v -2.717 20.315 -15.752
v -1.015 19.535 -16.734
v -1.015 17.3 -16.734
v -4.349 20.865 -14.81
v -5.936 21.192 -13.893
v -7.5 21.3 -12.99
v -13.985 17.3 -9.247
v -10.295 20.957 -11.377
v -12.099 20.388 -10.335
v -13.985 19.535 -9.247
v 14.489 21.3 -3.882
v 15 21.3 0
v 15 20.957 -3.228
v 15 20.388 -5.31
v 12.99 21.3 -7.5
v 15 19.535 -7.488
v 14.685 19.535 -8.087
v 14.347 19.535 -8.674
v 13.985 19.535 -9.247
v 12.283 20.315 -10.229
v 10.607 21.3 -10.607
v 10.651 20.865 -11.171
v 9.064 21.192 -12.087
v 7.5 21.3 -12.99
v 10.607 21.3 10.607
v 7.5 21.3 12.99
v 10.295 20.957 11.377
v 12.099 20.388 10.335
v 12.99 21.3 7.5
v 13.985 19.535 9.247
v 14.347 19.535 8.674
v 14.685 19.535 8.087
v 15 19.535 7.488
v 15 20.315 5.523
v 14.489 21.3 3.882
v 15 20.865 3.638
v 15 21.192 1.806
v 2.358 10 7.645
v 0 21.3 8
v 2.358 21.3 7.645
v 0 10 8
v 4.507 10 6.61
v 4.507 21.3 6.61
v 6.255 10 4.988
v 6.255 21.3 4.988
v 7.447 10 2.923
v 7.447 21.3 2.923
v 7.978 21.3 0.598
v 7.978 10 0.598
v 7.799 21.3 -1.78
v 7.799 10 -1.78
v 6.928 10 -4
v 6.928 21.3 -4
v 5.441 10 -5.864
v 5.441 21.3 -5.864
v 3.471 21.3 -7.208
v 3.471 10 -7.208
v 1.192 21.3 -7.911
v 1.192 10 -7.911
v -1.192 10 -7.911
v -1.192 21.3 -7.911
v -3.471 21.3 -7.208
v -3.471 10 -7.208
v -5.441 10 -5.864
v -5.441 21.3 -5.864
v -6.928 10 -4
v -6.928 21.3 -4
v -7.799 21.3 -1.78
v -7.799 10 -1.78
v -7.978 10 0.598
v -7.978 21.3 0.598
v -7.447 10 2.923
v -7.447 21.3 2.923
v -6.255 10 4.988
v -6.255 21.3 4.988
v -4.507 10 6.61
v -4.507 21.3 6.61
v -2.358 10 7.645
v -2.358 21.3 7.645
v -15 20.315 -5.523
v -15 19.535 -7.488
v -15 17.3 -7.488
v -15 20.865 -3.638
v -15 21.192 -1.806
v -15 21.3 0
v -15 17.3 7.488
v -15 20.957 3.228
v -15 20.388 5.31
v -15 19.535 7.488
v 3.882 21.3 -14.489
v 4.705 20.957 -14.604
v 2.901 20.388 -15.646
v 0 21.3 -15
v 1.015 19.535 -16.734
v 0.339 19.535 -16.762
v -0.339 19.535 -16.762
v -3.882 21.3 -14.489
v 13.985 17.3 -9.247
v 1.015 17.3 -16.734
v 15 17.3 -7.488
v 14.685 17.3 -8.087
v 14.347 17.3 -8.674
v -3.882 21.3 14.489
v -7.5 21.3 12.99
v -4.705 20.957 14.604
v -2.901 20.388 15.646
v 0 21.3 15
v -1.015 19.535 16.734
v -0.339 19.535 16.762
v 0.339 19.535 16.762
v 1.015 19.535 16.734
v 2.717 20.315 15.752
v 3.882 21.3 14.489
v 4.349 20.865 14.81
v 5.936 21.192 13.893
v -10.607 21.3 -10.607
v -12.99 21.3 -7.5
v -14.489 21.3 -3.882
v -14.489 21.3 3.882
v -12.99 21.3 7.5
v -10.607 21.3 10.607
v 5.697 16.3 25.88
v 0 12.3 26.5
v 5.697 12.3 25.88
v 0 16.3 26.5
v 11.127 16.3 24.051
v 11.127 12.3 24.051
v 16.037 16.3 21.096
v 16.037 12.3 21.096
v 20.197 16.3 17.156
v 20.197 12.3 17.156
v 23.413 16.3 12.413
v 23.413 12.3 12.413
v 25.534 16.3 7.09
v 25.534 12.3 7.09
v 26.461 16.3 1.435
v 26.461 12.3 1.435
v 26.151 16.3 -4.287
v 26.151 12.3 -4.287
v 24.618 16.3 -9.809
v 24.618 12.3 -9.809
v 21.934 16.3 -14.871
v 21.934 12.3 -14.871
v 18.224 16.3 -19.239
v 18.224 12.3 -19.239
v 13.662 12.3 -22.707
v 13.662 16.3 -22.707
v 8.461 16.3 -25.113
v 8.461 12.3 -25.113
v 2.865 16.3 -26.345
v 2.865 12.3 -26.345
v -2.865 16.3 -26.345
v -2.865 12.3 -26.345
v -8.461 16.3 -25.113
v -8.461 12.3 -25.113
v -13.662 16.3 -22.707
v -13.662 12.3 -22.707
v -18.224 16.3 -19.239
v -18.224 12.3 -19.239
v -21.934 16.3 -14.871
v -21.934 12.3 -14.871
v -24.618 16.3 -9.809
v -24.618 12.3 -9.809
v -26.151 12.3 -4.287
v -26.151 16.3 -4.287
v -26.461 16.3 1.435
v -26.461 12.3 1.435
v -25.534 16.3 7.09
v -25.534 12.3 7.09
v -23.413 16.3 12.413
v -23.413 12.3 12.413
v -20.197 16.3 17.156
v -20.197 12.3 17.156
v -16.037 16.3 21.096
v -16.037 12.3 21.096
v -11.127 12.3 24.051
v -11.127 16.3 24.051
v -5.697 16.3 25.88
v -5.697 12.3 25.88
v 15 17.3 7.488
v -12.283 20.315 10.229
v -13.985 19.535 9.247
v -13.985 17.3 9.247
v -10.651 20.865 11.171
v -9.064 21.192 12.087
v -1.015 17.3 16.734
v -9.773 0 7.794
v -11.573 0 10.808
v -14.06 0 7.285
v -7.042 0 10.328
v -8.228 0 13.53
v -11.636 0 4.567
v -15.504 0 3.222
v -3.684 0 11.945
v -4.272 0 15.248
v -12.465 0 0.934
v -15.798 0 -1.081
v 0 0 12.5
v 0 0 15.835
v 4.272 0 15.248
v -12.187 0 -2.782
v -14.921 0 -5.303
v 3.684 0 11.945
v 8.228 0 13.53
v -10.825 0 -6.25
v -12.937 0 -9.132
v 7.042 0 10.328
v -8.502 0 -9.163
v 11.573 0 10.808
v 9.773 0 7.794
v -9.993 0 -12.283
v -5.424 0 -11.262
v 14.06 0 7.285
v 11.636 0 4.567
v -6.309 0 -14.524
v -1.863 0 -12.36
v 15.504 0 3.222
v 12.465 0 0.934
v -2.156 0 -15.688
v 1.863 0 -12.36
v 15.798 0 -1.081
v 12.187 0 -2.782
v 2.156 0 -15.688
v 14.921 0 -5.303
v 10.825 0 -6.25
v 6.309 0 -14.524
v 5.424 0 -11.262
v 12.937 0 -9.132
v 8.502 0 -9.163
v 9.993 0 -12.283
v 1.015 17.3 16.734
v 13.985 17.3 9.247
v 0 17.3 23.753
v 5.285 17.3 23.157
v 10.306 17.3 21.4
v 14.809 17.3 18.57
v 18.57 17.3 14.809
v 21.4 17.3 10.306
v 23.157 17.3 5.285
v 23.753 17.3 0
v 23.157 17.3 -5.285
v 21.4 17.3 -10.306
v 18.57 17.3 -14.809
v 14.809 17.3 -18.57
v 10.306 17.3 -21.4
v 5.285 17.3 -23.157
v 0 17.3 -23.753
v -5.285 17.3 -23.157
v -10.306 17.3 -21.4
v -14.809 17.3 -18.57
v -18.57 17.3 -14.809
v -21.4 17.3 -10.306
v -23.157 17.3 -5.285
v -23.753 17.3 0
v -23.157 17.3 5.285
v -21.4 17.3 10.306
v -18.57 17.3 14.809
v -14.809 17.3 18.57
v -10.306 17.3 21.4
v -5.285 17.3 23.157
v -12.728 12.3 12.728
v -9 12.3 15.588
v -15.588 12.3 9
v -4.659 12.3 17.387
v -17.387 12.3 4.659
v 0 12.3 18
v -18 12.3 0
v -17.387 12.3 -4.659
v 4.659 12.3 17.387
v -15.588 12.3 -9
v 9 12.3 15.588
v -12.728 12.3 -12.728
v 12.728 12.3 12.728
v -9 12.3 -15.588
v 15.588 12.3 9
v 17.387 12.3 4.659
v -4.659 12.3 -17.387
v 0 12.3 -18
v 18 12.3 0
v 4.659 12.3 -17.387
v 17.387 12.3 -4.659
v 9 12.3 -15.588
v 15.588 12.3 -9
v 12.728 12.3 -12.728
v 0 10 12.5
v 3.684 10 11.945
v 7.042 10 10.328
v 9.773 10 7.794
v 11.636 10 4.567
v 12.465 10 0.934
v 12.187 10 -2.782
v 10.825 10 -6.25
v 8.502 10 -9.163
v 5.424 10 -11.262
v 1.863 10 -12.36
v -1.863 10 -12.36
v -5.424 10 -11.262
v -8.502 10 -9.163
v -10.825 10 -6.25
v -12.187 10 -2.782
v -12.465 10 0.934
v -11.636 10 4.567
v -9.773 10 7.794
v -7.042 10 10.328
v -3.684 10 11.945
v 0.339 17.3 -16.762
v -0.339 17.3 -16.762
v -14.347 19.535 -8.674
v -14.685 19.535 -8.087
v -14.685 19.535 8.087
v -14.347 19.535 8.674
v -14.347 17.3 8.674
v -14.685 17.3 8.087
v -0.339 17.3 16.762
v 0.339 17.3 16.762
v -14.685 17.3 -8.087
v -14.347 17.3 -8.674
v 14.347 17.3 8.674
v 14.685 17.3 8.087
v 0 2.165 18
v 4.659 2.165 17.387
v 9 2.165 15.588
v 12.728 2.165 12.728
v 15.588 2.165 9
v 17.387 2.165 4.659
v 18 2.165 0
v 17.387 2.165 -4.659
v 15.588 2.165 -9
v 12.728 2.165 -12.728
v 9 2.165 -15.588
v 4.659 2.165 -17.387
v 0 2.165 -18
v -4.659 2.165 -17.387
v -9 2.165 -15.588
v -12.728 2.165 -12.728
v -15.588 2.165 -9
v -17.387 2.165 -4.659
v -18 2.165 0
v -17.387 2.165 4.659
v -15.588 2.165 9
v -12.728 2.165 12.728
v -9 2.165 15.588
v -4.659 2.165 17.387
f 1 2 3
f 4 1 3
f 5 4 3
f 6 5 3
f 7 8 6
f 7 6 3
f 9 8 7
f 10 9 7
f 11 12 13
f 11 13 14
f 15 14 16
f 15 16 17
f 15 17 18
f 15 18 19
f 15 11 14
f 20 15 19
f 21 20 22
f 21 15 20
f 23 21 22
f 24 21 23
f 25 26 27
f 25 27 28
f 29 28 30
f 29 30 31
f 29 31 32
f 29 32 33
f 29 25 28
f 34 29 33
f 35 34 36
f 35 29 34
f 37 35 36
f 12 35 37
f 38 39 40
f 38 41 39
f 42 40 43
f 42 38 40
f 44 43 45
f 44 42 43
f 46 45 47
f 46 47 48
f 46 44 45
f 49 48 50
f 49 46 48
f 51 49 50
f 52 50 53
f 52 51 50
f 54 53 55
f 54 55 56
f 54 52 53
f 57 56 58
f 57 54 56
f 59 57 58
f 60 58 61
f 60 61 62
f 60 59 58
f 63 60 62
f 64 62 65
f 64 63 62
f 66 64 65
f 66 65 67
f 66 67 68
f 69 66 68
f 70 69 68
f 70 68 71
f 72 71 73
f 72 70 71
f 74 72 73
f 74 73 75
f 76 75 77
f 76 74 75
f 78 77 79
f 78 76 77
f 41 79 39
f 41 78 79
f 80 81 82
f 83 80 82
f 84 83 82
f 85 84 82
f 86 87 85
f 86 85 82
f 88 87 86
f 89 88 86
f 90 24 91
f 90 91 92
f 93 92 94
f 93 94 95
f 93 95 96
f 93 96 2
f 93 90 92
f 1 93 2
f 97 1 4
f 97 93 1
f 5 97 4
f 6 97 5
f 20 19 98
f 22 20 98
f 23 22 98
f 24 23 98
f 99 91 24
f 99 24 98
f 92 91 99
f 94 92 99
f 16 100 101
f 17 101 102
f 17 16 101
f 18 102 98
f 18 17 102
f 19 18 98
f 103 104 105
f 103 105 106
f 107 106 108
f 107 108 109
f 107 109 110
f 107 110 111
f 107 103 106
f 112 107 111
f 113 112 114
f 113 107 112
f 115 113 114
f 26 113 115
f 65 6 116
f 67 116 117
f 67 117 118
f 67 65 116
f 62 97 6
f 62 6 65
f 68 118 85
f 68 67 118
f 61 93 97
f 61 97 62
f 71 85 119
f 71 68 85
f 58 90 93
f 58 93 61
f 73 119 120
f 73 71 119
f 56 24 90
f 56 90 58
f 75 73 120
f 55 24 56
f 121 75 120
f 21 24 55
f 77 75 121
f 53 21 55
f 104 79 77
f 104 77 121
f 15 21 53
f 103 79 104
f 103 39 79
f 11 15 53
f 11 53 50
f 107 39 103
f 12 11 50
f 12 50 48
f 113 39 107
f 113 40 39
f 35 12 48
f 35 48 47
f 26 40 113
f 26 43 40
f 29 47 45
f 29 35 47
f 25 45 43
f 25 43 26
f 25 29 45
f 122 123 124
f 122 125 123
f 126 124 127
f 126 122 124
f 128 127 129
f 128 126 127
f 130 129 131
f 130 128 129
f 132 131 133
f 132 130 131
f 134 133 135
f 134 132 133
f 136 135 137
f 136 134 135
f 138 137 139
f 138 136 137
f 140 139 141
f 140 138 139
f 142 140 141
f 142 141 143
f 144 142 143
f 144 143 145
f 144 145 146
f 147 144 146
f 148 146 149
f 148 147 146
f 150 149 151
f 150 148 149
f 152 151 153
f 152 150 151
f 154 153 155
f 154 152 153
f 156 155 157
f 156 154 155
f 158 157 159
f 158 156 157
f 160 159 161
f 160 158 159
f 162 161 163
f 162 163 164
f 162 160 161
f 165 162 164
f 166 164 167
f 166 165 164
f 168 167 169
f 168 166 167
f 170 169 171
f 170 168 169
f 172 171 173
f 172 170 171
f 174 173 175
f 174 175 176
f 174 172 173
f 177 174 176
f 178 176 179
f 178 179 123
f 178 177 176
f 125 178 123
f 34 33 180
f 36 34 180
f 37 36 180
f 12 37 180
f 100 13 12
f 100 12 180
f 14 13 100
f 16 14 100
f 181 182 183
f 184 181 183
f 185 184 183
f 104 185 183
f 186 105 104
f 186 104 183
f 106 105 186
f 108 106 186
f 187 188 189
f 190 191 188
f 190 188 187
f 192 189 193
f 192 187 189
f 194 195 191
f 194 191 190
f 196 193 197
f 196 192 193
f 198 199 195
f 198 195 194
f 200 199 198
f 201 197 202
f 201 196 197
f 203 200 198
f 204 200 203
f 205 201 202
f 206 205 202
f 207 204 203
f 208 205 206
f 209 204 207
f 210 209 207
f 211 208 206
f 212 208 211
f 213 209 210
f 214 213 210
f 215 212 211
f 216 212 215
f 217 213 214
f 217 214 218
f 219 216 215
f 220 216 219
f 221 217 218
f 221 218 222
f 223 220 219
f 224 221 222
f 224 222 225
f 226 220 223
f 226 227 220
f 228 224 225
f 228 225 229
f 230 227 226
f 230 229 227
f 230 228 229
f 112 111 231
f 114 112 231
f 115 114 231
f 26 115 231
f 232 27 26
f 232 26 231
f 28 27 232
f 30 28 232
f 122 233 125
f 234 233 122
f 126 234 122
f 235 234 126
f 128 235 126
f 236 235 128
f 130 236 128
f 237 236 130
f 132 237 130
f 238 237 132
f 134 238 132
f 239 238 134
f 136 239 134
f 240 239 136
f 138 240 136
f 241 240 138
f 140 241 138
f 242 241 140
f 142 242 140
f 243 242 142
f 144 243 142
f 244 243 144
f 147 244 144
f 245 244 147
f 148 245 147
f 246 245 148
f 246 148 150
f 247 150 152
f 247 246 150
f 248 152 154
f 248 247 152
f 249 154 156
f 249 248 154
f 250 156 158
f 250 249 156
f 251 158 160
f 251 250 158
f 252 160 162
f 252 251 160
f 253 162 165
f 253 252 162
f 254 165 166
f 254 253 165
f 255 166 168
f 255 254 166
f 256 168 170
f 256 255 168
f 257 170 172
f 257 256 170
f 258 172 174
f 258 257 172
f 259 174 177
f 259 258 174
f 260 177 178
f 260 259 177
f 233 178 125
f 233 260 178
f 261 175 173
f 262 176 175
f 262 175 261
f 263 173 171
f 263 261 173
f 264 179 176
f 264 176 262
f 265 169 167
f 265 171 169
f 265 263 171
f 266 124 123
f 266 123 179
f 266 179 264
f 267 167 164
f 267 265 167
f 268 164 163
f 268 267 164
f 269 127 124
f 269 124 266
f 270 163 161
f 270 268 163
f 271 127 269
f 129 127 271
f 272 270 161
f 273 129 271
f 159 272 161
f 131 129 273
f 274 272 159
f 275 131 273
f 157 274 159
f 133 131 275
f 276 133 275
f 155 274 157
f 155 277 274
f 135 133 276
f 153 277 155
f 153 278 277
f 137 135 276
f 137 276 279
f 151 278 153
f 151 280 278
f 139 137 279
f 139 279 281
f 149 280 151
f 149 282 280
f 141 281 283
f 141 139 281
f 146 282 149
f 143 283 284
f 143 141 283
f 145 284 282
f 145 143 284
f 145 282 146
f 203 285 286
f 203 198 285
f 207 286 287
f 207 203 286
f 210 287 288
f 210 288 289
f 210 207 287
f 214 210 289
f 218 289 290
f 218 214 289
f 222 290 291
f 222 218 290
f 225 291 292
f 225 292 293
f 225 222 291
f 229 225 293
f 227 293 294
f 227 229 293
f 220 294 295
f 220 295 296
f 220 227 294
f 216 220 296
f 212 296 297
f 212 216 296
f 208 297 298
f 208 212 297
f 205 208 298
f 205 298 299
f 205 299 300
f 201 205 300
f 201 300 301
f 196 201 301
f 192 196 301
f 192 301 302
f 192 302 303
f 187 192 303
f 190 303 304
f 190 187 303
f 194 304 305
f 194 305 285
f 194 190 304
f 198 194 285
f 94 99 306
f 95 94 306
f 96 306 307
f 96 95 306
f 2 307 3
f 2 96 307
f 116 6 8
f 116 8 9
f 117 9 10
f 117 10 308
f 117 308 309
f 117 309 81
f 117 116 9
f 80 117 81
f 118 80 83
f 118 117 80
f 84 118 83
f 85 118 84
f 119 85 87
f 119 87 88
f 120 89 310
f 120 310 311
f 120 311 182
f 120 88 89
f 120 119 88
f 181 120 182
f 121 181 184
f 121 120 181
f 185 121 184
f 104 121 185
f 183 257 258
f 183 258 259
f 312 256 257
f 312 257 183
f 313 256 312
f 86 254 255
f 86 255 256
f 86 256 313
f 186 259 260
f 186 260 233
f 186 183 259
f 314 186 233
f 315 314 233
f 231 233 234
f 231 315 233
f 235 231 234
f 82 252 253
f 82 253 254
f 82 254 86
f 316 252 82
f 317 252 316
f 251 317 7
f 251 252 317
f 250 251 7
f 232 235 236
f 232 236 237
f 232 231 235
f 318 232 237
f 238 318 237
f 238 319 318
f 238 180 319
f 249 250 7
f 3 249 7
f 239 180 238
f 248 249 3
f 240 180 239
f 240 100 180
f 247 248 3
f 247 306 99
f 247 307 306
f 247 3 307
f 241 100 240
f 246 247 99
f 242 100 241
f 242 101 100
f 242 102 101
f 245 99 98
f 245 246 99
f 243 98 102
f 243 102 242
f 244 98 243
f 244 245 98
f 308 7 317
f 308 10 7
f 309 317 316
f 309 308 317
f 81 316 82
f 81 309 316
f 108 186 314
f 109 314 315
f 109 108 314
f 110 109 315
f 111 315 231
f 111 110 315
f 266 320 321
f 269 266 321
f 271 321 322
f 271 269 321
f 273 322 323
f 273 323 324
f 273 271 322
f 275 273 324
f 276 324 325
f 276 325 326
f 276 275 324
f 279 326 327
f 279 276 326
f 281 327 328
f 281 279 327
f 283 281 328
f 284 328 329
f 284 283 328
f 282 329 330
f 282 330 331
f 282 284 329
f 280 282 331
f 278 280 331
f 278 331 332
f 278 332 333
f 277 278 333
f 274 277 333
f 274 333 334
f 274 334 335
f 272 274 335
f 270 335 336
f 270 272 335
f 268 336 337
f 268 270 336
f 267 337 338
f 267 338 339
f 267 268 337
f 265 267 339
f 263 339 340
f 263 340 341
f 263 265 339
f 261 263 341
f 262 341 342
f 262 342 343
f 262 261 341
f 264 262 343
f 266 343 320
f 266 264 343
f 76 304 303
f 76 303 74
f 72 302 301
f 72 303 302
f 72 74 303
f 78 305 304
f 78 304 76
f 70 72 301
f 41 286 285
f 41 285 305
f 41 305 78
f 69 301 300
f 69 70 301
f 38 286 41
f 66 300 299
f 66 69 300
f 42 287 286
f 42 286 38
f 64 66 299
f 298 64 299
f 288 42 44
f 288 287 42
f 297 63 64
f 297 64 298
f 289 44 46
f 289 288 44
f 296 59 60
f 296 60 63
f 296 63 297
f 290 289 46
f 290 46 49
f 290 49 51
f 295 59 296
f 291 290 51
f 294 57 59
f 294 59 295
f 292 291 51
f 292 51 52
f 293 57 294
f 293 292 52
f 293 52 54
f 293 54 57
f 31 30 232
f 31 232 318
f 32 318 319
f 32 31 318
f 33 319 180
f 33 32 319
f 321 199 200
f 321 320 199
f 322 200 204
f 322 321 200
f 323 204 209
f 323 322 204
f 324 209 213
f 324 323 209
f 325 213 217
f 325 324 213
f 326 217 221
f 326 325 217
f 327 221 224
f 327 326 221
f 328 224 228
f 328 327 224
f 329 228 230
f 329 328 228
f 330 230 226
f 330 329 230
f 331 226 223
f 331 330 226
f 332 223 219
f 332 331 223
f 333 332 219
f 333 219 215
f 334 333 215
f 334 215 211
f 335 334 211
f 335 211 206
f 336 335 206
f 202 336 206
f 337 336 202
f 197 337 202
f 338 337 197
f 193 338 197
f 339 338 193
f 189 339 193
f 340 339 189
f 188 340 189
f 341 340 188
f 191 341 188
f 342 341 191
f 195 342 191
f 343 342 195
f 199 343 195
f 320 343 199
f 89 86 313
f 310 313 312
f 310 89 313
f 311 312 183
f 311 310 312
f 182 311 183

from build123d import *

# Parameters (mm, degrees)
SKETCH_2_W          = 102.444219067
SKETCH_2_H          = 95.84178499
CUT_EXTRUDE_1_DEPTH = 4


with BuildPart() as part:
    # 草图1 → 旋转1 (revolve)
    with BuildSketch(Plane.XY):
        Polygon((8, 21.3), (8, 10), (12.5, 10), (12.5, 0), (15.835, 0), (18, 2.165), (18, 12.3), (26.5, 12.3), (26.5, 16.3), (23.752522581, 17.3), (16.765, 17.3), (16.765, 19.535), (15, 21.3), align=None)
    revolve(axis=Axis((0, 0, 0), (0, 1, 0)))

    # 草图2 → 切除-拉伸1 (cut)
    with BuildSketch(Plane(origin=(0, 21.3, 0), x_dir=(1, 0, 0), z_dir=(0, 1, 0))):
        with Locations((3.088235295, -0.106490872)):
            Rectangle(SKETCH_2_W, SKETCH_2_H)
        Polygon((-15, 8.660254038), (-15, -8.660254038), (0, -17.320508076), (15, -8.660254038), (15, 8.660254038), (0, 17.320508076), align=None, mode=Mode.SUBTRACT)
    extrude(amount=-CUT_EXTRUDE_1_DEPTH, mode=Mode.SUBTRACT)


solid = part.part
